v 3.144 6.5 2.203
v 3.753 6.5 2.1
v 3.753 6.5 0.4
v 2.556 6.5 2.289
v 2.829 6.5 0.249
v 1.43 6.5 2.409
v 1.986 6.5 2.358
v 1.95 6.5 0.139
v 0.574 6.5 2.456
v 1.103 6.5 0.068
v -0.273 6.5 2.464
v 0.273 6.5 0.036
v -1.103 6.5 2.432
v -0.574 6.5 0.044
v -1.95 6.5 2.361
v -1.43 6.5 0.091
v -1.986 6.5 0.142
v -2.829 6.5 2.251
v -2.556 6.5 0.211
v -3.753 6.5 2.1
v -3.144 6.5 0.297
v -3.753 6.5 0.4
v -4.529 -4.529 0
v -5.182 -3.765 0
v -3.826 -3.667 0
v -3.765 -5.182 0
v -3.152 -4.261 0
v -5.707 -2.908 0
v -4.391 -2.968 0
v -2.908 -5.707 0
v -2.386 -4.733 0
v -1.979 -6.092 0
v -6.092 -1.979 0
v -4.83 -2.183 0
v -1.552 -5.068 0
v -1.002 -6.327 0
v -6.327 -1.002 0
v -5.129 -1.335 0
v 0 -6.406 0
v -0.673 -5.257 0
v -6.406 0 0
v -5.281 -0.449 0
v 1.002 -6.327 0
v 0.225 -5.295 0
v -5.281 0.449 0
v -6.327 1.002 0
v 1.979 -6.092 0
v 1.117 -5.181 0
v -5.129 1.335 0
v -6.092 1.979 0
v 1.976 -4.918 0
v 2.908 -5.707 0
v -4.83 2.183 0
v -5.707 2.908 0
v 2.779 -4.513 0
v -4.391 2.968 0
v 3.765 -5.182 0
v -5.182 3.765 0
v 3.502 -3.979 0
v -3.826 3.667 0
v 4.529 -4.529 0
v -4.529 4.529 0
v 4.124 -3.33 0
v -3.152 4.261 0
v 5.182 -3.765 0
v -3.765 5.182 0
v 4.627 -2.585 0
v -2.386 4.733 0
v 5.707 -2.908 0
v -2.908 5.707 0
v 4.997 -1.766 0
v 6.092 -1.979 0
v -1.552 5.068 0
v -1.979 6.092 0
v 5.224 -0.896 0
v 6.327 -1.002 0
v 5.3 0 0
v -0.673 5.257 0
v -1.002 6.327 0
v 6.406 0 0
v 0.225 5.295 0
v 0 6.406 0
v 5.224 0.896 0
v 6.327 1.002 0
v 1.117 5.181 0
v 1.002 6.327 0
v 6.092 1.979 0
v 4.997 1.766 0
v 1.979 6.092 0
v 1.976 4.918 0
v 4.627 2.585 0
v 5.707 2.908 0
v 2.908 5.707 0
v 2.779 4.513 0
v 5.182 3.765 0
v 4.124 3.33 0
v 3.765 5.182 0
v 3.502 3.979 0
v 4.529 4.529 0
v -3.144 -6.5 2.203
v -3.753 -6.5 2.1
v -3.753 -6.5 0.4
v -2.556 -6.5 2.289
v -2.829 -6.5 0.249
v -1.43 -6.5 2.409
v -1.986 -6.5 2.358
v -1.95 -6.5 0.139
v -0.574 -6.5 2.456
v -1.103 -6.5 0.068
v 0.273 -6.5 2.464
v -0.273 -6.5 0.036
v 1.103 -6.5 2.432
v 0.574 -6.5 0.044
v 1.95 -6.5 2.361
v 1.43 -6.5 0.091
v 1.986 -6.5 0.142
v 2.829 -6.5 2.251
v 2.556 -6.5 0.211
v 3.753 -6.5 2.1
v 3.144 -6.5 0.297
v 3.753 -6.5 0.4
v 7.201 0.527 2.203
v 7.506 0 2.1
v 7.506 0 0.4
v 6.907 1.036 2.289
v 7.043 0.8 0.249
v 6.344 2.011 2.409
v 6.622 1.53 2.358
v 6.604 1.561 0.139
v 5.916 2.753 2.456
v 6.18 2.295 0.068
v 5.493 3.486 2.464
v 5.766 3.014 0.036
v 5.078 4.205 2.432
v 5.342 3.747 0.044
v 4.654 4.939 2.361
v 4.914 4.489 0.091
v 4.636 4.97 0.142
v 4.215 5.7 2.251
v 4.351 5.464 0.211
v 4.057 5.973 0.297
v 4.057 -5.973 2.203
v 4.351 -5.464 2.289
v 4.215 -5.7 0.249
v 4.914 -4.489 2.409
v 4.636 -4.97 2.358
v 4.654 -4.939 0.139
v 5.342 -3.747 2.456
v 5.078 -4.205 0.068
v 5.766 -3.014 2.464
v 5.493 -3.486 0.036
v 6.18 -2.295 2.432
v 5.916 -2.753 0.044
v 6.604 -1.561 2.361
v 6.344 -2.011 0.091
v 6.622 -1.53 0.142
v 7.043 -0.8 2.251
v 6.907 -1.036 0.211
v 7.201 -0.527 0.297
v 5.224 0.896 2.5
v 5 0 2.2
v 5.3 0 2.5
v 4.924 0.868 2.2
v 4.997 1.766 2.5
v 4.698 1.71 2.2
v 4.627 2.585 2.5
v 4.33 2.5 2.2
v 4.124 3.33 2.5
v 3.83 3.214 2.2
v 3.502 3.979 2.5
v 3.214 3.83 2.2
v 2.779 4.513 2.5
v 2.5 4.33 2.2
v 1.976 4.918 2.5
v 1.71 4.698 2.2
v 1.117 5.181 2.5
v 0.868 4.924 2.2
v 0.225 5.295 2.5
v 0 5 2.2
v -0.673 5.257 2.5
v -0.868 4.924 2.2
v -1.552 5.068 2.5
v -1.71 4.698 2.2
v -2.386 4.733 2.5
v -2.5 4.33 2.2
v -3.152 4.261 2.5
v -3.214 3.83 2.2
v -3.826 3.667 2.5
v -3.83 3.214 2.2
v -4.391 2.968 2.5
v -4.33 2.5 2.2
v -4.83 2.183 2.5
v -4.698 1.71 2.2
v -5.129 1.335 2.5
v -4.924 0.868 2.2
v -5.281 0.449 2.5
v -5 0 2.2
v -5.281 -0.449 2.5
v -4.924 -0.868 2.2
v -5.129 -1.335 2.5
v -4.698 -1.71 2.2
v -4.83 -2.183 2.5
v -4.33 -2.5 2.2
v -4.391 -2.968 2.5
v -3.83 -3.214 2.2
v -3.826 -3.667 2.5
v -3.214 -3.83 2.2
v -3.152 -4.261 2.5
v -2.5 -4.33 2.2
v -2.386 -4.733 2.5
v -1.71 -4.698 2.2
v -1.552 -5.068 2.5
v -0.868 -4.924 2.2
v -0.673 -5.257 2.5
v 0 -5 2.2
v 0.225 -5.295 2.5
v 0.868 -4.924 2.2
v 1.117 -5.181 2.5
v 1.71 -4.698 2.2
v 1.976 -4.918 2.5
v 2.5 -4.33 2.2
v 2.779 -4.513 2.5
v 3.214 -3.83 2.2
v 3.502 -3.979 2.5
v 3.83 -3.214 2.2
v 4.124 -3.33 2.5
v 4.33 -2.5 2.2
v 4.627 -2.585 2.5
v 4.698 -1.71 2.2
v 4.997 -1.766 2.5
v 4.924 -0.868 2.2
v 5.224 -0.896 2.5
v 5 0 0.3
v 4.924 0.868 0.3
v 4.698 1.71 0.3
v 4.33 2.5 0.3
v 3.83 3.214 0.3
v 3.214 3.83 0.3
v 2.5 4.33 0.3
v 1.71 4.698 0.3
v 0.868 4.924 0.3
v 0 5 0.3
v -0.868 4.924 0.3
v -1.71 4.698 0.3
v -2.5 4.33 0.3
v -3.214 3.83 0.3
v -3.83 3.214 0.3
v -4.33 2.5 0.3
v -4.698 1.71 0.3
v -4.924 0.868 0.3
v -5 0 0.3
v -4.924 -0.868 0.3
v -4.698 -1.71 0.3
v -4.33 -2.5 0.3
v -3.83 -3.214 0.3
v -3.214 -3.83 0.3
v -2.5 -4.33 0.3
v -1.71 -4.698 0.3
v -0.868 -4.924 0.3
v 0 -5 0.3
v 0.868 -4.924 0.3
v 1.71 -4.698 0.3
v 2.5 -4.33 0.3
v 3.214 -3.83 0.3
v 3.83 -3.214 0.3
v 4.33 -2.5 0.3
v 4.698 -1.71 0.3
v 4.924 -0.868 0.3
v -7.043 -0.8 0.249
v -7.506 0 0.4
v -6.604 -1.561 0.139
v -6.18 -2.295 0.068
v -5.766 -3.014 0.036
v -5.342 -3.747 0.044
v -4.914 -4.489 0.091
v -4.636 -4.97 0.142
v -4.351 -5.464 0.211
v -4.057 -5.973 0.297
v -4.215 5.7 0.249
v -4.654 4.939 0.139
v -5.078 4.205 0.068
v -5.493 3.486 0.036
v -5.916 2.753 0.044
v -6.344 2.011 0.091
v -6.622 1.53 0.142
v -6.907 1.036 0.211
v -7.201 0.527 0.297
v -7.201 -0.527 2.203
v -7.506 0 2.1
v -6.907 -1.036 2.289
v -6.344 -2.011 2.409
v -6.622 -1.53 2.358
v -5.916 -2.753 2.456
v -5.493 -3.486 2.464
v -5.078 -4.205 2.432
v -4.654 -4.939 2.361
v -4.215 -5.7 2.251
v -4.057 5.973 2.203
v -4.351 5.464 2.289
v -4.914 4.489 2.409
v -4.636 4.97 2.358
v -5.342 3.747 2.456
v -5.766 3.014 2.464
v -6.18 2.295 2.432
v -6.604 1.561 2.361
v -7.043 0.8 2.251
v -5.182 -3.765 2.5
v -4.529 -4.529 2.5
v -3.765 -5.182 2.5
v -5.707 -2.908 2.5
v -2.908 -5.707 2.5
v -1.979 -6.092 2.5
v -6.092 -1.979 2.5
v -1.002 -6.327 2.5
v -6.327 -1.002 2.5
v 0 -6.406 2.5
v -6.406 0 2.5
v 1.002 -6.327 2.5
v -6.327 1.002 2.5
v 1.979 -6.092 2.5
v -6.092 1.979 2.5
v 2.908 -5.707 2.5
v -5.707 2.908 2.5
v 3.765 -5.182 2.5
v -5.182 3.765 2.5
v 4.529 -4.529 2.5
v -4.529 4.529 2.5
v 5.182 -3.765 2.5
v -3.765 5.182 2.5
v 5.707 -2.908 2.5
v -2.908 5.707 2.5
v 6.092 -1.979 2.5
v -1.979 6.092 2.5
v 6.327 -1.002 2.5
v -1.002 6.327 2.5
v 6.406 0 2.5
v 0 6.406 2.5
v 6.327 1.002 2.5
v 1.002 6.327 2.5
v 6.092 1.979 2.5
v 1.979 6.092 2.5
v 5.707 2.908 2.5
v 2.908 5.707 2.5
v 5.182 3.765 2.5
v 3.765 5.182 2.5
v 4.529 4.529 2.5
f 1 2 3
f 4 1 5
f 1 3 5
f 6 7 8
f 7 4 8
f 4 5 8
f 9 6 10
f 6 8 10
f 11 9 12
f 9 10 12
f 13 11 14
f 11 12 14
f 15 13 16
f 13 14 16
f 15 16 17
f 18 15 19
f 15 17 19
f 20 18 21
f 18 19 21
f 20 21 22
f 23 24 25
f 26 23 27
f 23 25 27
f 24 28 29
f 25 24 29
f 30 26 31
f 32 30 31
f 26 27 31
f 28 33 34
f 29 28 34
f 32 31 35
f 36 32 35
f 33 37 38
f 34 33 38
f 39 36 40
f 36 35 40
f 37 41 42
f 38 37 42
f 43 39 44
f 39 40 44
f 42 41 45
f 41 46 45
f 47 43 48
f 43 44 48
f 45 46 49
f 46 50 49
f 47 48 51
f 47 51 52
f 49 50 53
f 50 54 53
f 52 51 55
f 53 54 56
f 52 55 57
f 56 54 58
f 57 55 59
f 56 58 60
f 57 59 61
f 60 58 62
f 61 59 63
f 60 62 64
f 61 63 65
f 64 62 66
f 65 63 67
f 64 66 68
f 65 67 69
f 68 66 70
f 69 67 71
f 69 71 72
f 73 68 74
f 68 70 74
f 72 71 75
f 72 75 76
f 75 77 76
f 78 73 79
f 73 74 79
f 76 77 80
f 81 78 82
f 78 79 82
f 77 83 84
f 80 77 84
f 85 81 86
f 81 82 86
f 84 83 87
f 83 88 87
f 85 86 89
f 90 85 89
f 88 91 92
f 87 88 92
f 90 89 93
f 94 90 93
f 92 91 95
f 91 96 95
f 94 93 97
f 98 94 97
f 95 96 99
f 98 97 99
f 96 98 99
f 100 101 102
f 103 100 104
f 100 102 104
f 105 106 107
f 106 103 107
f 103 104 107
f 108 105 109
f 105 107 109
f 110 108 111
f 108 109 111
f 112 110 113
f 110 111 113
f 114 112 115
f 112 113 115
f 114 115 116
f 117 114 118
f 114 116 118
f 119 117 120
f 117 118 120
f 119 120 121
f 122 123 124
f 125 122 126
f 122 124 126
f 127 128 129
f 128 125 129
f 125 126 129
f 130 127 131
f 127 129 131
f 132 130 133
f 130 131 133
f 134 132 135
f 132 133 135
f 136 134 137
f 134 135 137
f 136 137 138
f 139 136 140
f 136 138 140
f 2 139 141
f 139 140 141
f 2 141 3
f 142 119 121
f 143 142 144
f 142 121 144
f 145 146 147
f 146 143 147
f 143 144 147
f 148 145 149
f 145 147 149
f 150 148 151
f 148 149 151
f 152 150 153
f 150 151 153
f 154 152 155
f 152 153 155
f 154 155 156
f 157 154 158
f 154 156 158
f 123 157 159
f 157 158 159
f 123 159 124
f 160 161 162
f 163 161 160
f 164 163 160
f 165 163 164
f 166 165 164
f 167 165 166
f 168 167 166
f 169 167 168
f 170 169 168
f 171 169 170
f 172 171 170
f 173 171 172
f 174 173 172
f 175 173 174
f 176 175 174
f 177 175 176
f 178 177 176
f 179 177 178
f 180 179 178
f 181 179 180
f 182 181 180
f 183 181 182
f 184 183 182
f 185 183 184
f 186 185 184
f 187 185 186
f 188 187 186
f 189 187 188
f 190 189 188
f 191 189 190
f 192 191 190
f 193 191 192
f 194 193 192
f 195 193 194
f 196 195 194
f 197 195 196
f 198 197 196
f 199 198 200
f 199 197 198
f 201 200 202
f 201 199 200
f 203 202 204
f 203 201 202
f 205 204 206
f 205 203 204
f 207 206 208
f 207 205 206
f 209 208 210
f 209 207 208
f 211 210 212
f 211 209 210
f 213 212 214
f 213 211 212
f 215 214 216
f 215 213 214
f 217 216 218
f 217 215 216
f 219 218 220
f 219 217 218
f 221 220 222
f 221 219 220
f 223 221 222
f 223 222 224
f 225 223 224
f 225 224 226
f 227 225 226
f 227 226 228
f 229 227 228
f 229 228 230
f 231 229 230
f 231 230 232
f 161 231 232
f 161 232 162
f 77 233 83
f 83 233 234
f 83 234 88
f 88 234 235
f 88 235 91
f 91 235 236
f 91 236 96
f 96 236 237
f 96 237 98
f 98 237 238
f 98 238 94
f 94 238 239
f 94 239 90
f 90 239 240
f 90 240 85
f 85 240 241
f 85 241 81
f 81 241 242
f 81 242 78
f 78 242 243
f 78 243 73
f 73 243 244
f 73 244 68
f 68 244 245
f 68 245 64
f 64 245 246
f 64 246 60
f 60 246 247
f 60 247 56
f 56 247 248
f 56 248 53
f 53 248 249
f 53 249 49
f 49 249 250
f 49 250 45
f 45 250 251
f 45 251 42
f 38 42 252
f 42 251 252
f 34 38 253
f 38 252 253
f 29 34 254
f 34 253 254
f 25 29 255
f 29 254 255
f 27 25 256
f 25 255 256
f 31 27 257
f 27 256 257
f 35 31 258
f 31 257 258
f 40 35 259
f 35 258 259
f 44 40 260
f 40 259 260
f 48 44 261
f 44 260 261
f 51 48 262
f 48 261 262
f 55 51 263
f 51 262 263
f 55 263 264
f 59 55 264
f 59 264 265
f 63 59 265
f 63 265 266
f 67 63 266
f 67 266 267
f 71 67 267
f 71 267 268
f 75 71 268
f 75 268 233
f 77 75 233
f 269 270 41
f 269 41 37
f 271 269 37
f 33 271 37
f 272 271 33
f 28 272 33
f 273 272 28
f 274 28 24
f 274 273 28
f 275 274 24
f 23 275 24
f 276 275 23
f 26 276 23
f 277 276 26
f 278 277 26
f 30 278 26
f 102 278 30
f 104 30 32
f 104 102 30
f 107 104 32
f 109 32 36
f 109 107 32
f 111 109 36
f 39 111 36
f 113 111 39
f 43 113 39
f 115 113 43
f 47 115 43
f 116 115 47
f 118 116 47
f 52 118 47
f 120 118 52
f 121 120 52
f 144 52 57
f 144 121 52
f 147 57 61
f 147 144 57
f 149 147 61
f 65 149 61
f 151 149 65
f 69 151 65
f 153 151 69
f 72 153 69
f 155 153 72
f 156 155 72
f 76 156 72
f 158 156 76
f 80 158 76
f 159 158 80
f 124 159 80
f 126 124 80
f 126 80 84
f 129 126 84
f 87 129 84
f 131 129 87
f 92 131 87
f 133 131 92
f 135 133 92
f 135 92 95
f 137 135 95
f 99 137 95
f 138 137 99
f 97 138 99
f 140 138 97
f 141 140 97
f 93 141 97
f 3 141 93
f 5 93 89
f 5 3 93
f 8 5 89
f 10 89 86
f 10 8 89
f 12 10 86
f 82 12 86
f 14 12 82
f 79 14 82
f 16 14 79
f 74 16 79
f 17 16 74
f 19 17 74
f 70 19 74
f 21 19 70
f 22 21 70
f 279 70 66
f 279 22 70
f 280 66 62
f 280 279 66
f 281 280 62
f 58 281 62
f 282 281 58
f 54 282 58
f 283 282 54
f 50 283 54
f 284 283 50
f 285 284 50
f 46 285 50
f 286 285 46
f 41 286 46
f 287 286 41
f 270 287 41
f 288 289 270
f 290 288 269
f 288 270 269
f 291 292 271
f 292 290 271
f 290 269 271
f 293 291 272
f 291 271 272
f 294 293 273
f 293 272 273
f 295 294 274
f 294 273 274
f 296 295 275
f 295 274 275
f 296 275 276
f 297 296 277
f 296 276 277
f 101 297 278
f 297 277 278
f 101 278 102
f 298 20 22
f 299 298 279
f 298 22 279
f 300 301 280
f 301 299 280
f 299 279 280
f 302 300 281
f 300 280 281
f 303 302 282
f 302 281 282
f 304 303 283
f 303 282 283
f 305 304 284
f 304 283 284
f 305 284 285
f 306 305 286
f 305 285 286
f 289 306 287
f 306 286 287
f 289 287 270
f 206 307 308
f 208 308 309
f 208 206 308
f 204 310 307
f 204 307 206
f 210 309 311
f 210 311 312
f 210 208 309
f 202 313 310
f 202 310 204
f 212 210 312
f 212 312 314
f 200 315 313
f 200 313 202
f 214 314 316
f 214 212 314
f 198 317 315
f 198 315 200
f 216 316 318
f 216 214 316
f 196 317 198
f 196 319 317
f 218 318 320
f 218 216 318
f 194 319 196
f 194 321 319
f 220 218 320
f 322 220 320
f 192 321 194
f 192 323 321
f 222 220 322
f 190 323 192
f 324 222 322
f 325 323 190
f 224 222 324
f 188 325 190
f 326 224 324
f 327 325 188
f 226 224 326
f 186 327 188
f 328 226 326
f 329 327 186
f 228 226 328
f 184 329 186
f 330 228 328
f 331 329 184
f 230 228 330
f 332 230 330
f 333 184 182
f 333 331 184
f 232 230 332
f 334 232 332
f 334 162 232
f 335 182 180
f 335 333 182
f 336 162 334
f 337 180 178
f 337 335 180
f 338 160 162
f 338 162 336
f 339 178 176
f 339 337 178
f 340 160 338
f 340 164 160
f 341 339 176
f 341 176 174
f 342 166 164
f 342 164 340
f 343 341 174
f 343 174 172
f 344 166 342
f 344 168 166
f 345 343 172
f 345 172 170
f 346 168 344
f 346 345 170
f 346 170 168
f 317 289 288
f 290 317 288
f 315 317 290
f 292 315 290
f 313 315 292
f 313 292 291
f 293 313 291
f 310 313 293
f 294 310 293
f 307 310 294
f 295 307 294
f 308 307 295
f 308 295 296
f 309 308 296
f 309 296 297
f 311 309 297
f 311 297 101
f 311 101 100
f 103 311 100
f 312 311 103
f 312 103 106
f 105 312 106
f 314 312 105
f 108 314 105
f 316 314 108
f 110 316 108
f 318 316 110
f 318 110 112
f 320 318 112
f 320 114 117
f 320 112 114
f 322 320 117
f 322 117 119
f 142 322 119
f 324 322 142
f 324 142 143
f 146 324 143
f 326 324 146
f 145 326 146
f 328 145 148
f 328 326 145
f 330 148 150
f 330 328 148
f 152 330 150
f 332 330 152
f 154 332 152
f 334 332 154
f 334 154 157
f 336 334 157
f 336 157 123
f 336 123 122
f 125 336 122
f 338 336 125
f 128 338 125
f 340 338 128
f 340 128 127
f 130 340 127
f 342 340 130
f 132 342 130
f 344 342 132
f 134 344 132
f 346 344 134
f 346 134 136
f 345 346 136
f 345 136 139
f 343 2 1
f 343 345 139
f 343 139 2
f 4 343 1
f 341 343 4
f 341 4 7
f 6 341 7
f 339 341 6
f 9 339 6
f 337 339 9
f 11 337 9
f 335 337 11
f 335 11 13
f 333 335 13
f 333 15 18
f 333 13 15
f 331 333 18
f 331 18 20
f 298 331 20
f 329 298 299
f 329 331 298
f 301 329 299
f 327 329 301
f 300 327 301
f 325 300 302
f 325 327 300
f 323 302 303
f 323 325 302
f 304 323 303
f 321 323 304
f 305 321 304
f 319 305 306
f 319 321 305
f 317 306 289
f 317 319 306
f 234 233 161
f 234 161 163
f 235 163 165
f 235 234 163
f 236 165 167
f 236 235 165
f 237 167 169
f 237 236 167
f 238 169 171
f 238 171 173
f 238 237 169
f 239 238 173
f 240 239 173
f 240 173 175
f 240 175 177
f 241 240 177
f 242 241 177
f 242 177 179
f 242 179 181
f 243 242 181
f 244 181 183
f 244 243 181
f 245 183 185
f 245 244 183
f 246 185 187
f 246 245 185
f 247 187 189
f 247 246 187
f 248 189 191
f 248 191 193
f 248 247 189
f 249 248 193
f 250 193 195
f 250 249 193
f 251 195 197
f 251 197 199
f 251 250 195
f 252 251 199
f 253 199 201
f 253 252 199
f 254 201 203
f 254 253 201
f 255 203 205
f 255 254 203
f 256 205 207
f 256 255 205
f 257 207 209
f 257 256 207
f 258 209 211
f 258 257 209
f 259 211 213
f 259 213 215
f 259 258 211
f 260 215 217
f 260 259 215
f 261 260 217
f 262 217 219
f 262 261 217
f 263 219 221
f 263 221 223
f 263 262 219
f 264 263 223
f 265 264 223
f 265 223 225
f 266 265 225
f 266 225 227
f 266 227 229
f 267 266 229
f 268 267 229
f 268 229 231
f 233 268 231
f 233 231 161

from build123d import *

# Parameters (mm, degrees)
ESQUISSE1_R        = 5
BOSS_EXTRU_1_DEPTH = 2.5
CHANFREIN1_SIZE    = 0.3


with BuildPart() as part:
    # Esquisse1 → Boss.-Extru.1 (new body)
    with BuildSketch(Plane.XY):
        Polygon((7.505553499, 0), (3.75277675, 6.5), (-3.75277675, 6.5), (-7.505553499, 0), (-3.75277675, -6.5), (3.75277675, -6.5), align=None)
        Circle(ESQUISSE1_R, mode=Mode.SUBTRACT)
    extrude(amount=BOSS_EXTRU_1_DEPTH)

    # Esquisse2 → Enlèvement de matière-Révolution1 (revolve, cut)
    with BuildSketch(Plane(origin=(0, 0, 0), x_dir=(1, 0, 0), z_dir=(0, 1, 0))):
        Polygon((-6.405553499, 0), (-7.505553499, -0.400367258), (-7.505553499, -2.099632742), (-6.405553499, -2.5), (-9.005553499, -2.5), (-9.005553499, 0), align=None)
    revolve(axis=Axis((0, 0, 0), (0, 0, 1)), mode=Mode.SUBTRACT)

    # Chanfrein1
    chanfrein1_edges = [part.edges().sort_by_distance(p)[0] for p in [
        (-5, 0, 0),
        (-5, 0, 2.5),
    ]]
    chamfer(chanfrein1_edges, length=CHANFREIN1_SIZE)


solid = part.part
